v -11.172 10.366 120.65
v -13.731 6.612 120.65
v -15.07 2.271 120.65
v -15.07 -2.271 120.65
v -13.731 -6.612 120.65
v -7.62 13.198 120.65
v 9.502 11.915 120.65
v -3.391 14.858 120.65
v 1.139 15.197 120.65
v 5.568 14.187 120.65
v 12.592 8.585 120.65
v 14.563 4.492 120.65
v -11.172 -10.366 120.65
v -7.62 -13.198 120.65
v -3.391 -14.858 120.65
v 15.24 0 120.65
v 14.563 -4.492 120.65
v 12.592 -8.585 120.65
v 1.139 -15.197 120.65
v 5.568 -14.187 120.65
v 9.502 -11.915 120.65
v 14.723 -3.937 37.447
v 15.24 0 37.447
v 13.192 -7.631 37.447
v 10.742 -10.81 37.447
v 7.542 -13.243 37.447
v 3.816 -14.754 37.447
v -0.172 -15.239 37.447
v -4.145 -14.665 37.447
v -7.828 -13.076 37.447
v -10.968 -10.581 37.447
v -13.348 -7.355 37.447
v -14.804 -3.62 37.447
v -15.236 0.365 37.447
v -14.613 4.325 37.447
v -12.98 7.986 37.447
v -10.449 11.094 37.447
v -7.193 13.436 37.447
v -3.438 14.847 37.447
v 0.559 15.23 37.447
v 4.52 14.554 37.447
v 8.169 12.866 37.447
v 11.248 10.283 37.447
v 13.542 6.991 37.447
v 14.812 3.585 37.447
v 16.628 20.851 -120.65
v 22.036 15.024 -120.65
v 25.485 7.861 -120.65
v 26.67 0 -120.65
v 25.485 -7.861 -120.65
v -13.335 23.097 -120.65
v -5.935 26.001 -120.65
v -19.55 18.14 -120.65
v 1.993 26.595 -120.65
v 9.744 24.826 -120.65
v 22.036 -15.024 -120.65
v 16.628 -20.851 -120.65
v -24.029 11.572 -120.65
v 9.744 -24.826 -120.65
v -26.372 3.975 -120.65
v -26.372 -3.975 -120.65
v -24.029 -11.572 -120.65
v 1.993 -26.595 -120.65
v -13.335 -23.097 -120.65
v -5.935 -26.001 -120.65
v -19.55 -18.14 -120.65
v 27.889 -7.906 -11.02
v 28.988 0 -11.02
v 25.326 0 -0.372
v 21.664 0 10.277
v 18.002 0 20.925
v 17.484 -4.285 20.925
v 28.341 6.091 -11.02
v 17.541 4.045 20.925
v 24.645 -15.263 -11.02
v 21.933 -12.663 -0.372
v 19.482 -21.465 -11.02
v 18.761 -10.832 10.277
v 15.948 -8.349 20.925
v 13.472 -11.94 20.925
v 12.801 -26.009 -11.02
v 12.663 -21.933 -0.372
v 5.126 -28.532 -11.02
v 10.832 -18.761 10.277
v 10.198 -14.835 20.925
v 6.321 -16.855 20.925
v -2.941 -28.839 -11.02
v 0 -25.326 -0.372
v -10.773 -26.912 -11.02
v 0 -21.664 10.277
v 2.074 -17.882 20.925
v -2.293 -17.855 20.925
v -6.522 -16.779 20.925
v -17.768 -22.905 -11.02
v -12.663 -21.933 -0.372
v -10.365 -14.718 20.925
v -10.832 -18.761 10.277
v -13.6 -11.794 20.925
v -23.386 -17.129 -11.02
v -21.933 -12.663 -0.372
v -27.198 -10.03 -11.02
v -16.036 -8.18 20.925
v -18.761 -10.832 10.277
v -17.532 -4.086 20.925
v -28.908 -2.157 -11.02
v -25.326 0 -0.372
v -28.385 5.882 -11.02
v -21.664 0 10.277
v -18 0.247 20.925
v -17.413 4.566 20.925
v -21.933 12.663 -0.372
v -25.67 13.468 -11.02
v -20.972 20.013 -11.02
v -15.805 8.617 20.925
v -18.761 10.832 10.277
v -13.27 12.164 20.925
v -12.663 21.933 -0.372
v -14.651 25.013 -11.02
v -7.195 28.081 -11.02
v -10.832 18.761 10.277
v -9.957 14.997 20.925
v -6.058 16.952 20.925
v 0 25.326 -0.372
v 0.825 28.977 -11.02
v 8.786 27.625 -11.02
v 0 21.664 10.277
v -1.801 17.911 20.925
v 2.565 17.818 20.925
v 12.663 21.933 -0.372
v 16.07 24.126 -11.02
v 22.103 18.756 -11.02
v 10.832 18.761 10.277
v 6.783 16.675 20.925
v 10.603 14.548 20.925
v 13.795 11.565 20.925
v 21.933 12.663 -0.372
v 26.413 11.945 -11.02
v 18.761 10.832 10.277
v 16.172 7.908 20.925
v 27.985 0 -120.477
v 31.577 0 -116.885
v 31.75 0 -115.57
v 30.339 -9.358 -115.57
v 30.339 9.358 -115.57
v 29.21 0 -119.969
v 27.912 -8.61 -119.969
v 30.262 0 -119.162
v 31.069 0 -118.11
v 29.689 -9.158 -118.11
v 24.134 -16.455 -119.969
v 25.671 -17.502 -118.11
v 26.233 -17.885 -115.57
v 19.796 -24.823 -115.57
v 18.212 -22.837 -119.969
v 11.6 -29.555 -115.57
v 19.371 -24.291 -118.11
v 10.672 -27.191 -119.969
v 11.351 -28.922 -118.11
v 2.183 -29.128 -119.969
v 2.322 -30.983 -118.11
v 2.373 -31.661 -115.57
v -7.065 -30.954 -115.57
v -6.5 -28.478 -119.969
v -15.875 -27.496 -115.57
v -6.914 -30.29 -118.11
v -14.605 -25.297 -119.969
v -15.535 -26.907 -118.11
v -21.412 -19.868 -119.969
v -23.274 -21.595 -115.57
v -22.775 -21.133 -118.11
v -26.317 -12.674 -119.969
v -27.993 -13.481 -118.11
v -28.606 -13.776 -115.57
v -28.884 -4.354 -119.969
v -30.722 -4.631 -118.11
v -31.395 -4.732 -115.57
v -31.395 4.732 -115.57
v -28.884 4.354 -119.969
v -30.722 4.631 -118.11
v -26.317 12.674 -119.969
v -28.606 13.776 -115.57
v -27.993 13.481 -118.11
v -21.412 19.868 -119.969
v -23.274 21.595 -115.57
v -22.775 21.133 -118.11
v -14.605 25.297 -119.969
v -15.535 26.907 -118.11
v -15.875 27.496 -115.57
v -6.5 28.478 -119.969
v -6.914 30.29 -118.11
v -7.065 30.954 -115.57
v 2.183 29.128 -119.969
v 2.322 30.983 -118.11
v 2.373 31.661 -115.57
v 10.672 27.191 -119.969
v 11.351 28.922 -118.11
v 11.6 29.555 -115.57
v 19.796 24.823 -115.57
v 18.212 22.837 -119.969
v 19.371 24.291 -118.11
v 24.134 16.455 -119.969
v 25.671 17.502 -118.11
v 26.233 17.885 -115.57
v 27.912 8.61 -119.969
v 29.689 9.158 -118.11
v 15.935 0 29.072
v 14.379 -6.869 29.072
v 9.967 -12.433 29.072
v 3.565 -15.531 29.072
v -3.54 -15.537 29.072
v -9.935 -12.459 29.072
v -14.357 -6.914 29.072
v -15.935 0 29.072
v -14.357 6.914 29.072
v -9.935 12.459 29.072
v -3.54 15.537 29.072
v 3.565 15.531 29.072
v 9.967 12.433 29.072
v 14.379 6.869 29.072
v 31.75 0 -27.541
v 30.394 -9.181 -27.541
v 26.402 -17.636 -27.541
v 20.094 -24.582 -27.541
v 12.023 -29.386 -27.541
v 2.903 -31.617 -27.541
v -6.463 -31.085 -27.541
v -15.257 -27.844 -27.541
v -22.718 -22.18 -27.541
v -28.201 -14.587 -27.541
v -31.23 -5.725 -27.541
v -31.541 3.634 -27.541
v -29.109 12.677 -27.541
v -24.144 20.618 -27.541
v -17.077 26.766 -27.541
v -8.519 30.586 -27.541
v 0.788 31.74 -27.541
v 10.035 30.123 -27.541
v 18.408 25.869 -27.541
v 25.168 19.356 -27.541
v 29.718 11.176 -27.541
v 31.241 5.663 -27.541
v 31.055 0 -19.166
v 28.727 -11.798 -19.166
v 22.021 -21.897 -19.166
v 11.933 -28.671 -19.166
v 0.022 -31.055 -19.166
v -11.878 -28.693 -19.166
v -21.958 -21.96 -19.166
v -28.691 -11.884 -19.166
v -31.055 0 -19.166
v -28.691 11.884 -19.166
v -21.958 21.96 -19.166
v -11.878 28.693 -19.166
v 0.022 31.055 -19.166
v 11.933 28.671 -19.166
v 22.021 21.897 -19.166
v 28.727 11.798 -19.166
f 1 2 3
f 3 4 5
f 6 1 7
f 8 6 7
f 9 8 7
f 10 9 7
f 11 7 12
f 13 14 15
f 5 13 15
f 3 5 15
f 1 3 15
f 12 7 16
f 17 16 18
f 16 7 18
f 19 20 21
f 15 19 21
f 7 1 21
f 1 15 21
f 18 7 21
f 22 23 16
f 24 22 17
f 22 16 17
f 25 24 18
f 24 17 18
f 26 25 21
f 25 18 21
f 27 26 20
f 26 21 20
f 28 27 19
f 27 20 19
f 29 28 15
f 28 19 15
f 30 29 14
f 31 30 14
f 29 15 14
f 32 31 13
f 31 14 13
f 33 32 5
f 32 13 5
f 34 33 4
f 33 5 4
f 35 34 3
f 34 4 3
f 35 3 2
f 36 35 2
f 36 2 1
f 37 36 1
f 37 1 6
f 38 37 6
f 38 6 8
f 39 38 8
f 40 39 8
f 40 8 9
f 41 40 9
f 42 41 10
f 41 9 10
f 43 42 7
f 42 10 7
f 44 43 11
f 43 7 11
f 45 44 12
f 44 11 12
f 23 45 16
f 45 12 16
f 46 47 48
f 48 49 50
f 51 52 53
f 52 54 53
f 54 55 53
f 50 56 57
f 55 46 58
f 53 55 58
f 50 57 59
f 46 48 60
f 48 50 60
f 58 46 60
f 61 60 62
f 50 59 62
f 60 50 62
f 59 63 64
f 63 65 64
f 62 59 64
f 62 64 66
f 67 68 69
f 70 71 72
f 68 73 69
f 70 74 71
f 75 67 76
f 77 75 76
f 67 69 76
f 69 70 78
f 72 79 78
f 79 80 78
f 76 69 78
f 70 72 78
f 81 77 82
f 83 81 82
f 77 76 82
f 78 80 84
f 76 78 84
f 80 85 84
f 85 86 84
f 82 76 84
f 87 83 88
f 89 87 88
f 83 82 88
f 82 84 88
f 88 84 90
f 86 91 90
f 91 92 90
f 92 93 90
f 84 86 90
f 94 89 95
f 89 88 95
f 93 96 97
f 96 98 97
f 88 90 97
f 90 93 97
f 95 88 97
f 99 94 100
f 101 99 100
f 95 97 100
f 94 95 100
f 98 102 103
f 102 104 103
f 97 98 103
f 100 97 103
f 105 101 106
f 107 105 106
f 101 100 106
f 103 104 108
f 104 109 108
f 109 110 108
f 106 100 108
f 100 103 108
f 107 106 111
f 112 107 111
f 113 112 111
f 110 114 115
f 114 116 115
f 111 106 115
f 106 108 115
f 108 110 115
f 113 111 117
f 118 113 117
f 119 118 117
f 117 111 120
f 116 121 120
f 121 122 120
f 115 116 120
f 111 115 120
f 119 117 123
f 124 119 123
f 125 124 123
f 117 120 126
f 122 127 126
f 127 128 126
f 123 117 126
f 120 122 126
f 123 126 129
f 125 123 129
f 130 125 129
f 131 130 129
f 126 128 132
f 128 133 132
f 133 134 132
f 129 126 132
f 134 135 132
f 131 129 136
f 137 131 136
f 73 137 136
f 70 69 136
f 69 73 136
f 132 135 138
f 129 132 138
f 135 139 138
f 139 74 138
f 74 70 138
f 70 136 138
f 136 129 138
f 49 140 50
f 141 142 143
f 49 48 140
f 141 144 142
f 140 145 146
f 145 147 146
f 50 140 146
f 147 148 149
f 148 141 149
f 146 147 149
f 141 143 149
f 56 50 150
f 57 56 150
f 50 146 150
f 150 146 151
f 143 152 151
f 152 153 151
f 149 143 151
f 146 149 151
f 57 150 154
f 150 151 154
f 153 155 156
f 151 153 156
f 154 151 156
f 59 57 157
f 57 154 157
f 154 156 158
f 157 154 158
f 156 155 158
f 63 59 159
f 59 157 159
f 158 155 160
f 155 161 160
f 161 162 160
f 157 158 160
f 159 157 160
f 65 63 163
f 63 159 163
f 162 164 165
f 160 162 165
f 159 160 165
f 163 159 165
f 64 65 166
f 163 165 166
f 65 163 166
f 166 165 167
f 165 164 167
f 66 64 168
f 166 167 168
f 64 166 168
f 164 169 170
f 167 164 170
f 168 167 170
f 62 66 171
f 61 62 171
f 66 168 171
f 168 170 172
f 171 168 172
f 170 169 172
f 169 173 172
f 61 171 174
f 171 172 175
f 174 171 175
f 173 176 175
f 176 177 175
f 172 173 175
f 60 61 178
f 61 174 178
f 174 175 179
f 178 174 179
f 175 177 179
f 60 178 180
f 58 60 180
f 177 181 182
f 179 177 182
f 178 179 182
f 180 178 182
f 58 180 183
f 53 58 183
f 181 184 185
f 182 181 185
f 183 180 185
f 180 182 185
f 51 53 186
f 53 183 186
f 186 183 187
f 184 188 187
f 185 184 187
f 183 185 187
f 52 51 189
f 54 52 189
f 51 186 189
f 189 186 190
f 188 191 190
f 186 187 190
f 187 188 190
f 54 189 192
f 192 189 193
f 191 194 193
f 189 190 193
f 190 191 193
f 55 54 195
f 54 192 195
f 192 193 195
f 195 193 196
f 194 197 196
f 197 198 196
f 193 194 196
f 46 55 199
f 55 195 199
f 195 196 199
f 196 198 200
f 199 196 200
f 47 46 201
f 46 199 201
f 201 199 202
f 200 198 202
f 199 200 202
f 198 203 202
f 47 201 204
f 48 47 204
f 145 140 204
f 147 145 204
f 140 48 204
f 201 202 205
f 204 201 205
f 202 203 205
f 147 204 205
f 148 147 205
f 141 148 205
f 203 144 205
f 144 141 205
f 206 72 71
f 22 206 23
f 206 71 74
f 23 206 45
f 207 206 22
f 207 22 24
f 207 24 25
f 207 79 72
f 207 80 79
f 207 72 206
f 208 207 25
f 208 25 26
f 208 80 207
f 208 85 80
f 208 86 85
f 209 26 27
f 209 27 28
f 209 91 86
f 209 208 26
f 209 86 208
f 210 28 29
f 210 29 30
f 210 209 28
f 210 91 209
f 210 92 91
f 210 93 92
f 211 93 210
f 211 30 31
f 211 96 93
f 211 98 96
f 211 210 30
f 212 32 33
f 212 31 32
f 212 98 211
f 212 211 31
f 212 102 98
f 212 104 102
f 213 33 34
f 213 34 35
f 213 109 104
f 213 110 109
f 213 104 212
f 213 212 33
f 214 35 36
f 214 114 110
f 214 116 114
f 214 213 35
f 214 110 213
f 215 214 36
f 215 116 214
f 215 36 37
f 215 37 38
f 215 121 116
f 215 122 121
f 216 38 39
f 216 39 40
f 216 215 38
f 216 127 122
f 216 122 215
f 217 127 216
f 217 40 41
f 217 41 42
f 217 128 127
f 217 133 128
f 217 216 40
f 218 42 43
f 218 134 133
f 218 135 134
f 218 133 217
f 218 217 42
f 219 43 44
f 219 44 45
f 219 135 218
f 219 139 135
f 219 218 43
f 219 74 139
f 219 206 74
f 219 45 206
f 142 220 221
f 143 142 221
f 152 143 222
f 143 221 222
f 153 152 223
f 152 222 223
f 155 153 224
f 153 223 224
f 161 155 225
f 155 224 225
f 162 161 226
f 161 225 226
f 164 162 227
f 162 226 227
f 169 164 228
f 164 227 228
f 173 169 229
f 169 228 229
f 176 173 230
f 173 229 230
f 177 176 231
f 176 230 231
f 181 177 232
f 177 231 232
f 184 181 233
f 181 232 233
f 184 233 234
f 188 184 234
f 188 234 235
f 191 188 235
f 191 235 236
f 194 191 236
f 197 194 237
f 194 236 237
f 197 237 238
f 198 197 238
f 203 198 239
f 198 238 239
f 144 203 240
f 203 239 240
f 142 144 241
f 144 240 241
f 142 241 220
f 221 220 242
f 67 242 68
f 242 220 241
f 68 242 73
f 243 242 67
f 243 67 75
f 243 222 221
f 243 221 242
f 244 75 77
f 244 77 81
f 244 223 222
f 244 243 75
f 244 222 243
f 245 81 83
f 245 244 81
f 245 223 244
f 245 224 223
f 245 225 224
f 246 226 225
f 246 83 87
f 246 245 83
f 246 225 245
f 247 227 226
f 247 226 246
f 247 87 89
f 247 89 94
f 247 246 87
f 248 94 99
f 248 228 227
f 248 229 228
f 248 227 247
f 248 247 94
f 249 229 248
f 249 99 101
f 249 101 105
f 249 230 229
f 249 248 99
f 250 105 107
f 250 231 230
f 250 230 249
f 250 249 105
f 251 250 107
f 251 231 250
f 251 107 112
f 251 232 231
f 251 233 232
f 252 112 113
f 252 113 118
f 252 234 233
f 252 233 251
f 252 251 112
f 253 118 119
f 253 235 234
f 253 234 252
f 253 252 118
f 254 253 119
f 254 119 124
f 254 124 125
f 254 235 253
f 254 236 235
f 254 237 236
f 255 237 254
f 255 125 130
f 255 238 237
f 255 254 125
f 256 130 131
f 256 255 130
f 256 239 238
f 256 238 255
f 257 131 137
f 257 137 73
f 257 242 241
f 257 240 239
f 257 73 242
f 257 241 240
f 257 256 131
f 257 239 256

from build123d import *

# Parameters (mm, degrees)
F2_R = 5.08
F3_R = 50.8


with BuildPart() as f1:
    # F0 (on Front) → F1 (revolve)
    with BuildSketch(Plane.XZ):
        Polygon((15.24, 120.65), (0, 120.65), (0, -120.65), (31.75, -120.65), (31.75, -19.05), (15.24, 28.955315), align=None)
    revolve(axis=Axis((0, 0, 2.313137), (0, 0, -1)))

    # F2
    f2_edges = [f1.edges().sort_by_distance(p)[0] for p in [
        (-31.75, 0, -120.65),
    ]]
    fillet(f2_edges, radius=F2_R)

    # F3
    f3_edges = [f1.edges().sort_by_distance(p)[0] for p in [
        (-31.75, 0, -19.05),
        (-15.24, 0, 28.955315),
    ]]
    fillet(f3_edges, radius=F3_R)


solid = f1.part
